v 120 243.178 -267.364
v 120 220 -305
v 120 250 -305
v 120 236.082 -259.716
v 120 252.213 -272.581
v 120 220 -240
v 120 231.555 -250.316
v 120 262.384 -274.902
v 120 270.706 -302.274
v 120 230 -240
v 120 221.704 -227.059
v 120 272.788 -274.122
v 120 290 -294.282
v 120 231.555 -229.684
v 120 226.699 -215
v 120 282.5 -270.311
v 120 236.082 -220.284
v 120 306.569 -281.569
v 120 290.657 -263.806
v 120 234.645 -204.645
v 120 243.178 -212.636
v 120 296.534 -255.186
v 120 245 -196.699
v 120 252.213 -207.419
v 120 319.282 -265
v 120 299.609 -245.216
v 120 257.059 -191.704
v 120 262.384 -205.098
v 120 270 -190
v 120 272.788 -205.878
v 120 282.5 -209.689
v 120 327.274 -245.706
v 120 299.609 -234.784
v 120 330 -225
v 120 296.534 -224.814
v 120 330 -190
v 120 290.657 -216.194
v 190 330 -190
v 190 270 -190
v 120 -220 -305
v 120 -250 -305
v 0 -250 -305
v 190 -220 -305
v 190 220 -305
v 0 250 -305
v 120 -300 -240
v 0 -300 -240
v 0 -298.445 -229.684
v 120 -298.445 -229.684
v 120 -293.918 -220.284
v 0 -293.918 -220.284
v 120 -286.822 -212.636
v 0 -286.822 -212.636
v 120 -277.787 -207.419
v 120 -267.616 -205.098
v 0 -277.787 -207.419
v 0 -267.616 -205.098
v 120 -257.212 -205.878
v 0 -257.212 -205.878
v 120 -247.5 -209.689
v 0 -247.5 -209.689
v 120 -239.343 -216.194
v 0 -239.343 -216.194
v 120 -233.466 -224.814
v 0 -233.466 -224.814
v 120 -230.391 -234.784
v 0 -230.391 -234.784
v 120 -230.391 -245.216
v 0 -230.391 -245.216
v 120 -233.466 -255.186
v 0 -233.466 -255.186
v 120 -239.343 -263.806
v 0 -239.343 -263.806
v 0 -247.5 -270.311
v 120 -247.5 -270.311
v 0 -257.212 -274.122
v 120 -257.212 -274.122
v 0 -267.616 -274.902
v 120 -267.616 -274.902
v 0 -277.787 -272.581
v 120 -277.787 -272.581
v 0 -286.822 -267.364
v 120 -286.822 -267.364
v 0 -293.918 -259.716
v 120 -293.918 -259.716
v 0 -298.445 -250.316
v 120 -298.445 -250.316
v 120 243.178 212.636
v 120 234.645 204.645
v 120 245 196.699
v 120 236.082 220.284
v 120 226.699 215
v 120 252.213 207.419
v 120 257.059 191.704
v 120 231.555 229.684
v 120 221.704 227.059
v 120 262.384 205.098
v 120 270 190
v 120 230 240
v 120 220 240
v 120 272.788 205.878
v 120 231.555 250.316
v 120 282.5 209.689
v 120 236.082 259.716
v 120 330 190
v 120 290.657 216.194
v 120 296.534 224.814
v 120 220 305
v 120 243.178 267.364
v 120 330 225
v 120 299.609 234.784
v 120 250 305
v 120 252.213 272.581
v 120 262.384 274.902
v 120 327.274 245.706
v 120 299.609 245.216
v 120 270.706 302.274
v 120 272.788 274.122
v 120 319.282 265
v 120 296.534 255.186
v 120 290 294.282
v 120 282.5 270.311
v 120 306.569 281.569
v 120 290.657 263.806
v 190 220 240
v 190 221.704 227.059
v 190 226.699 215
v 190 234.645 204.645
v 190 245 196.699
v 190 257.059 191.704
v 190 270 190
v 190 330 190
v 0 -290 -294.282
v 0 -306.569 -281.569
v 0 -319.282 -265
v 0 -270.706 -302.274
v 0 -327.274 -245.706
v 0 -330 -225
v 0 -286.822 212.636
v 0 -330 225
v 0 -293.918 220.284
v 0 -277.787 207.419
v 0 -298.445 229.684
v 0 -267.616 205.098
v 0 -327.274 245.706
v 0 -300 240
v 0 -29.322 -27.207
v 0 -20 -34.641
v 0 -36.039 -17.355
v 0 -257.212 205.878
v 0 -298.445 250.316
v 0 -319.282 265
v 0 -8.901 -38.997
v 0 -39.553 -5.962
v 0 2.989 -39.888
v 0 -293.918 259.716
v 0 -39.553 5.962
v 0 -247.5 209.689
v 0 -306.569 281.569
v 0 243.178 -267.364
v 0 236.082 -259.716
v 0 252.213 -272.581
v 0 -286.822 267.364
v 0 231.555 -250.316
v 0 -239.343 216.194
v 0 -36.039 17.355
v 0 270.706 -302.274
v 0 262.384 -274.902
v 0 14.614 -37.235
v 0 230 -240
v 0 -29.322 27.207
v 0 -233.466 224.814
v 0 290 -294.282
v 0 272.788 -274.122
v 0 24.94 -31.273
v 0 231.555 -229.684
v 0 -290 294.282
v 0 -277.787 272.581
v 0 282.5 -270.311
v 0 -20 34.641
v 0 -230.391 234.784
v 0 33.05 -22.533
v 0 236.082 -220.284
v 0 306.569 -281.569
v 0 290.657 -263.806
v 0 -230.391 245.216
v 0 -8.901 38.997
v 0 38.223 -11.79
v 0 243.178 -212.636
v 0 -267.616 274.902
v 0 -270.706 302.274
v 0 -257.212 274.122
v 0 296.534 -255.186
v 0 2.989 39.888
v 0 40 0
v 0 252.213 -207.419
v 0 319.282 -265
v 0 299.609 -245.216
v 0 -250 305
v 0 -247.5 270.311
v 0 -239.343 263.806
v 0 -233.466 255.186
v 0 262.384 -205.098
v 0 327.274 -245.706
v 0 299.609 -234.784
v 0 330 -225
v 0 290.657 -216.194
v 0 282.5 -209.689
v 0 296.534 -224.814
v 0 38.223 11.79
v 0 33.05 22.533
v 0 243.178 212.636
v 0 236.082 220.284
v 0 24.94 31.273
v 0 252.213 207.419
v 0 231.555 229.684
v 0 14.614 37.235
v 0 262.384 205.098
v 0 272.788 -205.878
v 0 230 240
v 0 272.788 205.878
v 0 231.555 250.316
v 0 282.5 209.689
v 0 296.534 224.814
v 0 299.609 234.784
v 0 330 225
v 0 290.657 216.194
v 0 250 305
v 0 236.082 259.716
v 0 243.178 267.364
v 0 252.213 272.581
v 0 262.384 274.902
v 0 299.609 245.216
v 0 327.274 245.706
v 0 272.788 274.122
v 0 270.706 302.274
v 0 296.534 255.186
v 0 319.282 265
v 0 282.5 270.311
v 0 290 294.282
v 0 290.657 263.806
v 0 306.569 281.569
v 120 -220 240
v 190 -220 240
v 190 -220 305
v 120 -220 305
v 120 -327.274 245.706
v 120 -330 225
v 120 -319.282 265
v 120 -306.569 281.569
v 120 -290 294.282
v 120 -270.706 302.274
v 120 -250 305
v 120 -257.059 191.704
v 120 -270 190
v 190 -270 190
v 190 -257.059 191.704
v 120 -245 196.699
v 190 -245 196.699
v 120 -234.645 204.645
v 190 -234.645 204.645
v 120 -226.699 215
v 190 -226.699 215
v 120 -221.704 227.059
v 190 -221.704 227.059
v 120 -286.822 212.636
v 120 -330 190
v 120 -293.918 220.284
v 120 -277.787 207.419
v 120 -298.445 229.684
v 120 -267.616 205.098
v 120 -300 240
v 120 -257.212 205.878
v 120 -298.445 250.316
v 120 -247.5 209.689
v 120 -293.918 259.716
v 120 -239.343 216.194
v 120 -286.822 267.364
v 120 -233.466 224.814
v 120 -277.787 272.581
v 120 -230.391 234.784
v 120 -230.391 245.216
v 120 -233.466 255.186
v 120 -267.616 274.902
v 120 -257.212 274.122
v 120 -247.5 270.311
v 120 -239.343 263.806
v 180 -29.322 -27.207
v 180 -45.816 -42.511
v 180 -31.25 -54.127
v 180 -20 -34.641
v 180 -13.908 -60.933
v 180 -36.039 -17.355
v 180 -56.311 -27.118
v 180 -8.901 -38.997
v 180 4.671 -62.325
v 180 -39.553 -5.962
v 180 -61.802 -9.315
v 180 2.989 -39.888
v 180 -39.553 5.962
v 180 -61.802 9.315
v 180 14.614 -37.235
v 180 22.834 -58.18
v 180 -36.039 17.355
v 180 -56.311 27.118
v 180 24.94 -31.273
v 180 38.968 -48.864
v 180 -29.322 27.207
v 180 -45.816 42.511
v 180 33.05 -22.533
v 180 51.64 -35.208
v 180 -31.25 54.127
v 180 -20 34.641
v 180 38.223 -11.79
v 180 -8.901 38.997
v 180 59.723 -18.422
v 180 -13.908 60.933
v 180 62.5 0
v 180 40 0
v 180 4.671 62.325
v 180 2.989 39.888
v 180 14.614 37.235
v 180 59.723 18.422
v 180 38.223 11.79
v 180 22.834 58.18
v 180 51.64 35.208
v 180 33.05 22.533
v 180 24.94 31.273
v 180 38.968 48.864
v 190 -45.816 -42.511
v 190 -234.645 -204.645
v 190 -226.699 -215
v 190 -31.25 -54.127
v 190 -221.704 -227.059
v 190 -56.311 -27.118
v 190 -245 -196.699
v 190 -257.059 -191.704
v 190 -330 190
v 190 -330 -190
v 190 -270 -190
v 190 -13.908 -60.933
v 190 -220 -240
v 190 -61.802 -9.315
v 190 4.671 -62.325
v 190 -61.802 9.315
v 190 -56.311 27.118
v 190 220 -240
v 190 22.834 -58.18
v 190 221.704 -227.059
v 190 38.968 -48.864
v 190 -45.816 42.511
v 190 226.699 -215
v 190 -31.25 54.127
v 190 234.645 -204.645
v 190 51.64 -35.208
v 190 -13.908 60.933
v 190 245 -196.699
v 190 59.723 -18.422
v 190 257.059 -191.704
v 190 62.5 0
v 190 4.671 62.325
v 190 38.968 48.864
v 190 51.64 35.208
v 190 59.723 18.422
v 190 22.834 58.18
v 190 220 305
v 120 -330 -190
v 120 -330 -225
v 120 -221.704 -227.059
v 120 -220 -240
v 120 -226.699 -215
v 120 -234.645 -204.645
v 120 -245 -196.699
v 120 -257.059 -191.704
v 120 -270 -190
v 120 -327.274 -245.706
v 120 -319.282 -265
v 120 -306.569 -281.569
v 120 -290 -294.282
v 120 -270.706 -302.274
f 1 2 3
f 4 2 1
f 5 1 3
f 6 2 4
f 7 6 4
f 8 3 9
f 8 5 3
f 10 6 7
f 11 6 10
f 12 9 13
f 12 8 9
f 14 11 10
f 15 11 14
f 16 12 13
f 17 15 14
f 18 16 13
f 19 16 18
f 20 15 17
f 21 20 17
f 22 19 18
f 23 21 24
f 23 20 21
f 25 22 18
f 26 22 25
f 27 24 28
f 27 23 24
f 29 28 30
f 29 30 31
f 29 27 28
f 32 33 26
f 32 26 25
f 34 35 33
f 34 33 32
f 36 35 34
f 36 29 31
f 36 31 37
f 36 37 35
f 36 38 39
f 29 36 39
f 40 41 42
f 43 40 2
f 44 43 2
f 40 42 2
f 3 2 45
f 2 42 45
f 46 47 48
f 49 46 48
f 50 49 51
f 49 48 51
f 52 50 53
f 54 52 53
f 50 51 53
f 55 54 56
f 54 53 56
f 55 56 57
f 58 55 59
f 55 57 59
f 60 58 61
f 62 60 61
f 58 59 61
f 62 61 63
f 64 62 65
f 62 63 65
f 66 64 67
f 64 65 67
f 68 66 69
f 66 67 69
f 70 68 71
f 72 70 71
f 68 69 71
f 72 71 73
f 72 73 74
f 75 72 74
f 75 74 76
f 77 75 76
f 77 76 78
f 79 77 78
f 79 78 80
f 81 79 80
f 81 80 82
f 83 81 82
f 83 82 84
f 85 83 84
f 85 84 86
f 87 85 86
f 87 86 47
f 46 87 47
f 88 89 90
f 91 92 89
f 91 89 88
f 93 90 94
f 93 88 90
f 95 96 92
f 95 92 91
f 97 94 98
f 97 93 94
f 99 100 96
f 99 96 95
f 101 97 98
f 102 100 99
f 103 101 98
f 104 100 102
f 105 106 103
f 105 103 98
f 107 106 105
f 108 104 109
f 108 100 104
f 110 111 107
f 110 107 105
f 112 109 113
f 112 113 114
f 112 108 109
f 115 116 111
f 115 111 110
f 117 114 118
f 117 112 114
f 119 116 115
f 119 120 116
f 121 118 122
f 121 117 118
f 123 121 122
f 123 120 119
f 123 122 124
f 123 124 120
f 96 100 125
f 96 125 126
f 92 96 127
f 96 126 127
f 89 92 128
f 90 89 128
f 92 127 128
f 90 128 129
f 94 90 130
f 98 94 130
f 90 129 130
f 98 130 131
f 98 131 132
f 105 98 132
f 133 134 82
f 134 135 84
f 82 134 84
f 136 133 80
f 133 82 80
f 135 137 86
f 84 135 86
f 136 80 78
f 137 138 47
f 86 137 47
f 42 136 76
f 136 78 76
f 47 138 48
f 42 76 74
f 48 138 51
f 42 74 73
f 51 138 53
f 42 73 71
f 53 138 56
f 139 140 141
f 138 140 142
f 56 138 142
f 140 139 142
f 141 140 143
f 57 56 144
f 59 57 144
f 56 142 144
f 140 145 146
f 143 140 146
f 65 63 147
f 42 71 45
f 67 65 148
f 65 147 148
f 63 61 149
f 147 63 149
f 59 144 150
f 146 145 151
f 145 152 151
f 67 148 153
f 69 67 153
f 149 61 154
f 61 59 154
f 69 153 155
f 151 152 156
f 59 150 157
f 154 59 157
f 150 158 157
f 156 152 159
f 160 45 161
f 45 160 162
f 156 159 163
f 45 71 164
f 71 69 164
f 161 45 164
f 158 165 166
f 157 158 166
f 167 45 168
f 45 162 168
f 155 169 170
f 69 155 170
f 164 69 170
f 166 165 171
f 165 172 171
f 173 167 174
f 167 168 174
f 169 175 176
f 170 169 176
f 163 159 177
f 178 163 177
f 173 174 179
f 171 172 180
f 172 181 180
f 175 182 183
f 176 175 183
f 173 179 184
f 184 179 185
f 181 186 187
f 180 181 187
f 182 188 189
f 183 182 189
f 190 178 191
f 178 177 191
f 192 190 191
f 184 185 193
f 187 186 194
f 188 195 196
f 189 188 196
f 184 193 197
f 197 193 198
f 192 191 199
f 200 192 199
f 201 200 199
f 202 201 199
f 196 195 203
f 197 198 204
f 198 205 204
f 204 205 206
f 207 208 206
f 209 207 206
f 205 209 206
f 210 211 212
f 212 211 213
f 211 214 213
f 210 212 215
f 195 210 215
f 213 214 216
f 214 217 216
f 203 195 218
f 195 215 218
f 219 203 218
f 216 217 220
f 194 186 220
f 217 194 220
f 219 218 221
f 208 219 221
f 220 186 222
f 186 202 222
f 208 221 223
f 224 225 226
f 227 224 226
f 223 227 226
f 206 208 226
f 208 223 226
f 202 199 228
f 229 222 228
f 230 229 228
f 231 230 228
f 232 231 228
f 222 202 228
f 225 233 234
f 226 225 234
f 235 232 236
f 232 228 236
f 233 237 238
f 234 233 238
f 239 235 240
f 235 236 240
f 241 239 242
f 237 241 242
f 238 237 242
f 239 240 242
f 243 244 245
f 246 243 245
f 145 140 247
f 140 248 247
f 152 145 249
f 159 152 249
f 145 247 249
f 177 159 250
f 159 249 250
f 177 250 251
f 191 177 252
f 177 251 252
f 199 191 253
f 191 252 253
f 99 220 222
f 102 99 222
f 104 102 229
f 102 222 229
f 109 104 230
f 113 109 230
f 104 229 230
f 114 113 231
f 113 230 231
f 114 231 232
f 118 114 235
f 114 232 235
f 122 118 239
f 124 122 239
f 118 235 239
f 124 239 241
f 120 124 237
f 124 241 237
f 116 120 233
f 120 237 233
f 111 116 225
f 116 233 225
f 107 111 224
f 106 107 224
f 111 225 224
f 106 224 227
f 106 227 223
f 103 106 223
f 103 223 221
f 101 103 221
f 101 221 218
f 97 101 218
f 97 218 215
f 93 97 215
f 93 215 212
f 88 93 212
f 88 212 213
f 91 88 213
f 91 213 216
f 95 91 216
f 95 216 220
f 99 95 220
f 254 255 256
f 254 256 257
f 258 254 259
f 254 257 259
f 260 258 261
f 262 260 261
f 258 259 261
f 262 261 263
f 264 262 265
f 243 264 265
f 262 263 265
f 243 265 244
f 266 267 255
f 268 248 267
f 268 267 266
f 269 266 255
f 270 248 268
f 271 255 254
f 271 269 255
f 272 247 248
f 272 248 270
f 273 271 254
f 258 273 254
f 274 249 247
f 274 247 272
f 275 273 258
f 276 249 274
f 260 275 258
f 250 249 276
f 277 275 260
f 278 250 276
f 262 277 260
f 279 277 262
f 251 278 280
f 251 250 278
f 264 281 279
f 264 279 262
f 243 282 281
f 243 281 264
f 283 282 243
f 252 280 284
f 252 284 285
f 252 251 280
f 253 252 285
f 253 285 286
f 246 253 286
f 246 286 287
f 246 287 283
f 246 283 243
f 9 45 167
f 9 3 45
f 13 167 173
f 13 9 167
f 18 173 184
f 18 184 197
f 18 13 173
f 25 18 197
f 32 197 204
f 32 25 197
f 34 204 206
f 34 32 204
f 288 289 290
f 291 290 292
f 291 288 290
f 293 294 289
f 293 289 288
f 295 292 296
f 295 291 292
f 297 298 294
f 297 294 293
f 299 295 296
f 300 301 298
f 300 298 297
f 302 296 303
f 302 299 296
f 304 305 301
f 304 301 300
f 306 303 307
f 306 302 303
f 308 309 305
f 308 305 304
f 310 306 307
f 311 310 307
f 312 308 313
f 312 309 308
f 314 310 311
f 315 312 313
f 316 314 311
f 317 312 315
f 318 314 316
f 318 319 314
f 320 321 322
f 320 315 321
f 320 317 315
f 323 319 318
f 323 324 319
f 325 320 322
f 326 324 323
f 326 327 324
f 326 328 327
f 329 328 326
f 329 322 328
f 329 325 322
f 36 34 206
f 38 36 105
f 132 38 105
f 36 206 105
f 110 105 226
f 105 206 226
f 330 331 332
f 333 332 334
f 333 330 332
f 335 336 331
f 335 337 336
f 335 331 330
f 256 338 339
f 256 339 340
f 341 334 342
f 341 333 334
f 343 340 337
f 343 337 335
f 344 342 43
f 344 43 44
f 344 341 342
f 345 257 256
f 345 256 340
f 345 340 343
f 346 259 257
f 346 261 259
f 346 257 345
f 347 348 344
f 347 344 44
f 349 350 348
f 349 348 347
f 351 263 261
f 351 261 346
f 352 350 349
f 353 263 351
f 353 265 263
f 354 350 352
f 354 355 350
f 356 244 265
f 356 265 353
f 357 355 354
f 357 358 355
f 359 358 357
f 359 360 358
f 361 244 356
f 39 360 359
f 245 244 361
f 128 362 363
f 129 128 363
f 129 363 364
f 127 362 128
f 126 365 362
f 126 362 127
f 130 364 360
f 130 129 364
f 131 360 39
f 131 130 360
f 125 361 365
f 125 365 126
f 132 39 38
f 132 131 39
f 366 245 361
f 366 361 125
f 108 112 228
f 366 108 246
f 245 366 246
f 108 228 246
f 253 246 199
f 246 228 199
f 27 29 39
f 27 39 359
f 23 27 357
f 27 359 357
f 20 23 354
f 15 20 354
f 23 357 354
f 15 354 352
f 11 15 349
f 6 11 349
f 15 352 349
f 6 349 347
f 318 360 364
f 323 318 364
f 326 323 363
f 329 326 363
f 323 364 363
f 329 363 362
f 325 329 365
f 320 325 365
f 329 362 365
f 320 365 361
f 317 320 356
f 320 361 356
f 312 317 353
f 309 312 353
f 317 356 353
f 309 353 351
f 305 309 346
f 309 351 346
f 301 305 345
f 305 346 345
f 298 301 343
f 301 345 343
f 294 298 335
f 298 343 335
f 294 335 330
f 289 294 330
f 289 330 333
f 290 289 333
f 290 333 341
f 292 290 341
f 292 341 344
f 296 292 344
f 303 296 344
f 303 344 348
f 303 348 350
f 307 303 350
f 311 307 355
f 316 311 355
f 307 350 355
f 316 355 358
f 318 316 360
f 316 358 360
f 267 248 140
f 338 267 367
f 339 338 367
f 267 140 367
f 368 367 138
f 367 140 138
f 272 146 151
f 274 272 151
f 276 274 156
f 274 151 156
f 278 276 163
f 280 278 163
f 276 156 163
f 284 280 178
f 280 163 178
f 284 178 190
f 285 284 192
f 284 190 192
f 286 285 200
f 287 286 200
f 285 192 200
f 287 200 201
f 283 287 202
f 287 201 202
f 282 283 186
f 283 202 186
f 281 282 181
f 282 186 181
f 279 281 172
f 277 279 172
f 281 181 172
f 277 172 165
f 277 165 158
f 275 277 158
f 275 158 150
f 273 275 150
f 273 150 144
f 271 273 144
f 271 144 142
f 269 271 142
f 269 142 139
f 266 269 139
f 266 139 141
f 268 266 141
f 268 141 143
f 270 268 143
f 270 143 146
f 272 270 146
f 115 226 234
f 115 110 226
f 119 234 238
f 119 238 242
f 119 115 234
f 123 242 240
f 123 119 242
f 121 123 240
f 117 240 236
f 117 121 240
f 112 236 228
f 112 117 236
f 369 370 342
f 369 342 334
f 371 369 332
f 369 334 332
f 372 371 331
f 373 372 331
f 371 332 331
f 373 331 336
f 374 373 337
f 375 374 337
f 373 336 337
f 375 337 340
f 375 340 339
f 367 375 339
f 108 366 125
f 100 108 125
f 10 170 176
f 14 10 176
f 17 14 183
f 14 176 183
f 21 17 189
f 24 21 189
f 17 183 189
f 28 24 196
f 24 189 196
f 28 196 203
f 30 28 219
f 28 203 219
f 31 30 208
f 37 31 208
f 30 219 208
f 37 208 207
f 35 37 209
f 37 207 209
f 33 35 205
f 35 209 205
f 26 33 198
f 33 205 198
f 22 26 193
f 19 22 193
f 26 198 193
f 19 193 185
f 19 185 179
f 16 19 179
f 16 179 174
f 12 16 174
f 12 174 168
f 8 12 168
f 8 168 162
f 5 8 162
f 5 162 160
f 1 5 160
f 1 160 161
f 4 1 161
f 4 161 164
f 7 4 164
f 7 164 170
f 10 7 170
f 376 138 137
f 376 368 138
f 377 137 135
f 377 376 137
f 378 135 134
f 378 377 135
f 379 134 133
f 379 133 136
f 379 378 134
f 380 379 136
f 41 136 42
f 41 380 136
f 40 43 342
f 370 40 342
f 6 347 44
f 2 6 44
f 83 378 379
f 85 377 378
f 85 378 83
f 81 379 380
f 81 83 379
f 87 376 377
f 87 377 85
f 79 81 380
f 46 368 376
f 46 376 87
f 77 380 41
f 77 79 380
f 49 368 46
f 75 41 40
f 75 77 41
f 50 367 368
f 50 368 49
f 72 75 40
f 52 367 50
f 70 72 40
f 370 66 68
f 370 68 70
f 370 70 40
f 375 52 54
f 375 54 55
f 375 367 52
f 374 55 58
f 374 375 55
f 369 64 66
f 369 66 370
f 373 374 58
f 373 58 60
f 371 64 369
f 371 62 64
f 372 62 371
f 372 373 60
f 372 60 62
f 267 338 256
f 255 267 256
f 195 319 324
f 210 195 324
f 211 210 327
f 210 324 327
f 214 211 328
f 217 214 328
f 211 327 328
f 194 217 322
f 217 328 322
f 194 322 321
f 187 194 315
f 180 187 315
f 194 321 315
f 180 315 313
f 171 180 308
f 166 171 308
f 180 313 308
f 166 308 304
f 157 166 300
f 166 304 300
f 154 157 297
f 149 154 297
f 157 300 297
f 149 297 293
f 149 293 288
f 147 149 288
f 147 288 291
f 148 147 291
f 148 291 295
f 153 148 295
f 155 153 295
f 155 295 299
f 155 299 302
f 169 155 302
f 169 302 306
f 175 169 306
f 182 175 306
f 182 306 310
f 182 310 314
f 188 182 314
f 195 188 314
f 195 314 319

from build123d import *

# Parameters (mm, degrees)
F0_W      = 660
F0_H      = 610
F1_DEPTH  = 120
F2_R      = 80
F4_DEPTH  = 70
F6_DEPTH  = 70
F7_DEPTH  = 70
F8_R      = 62.5
F9_DEPTH  = 10
F10_R     = 40
F11_DEPTH = 180.001
F12_R     = 35
F13_DEPTH = 190.001


with BuildPart() as f1:
    # F0 (on Right) → F1 (new body)
    with BuildSketch(Plane.YZ):
        Rectangle(F0_W, F0_H)
    extrude(amount=F1_DEPTH)

    # F2
    f2_edges = [f1.edges().sort_by_distance(p)[0] for p in [
        (60, 330, 305),
        (60, -330, 305),
        (60, 330, -305),
        (60, -330, -305),
    ]]
    fillet(f2_edges, radius=F2_R)

    # F3 (on face) → F4 (join)
    with BuildSketch(Plane.YZ.offset(120)):
        with BuildLine():
            ThreePointArc((250, 305), (306.5685424949, 281.5685424949), (330, 225))
            Line((330, 225), (330, 305))
            Line((330, 305), (250, 305))
        make_face()
        with BuildLine():
            Line((-330, 305), (-330, 225))
            ThreePointArc((-330, 225), (-306.5685424949, 281.5685424949), (-250, 305))
            Line((-250, 305), (-330, 305))
        make_face()
        with BuildLine():
            Line((-250, -305), (250, -305))
            ThreePointArc((250, -305), (306.5685424949, -281.5685424949), (330, -225))
            Line((330, -225), (330, 225))
            ThreePointArc((330, 225), (306.5685424949, 281.5685424949), (250, 305))
            Line((250, 305), (-250, 305))
            ThreePointArc((-250, 305), (-306.5685424949, 281.5685424949), (-330, 225))
            Line((-330, 225), (-330, -225))
            ThreePointArc((-330, -225), (-306.5685424949, -281.5685424949), (-250, -305))
        make_face()
        with BuildLine():
            Line((250, -305), (330, -305))
            Line((330, -305), (330, -225))
            ThreePointArc((330, -225), (306.5685424949, -281.5685424949), (250, -305))
        make_face()
        with BuildLine():
            Line((-330, -305), (-250, -305))
            ThreePointArc((-250, -305), (-306.5685424949, -281.5685424949), (-330, -225))
            Line((-330, -225), (-330, -305))
        make_face()
    extrude(amount=F4_DEPTH)

    # F5 (on face) → F6 (cut)
    with BuildSketch(Plane.YZ.offset(190)):
        with BuildLine():
            ThreePointArc((-270, 190), (-234.6446609407, 204.6446609407), (-220, 240))
            Line((-220, 240), (-220, 305))
            Line((-220, 305), (-330, 305))
            Line((-330, 305), (-330, 190))
            Line((-330, 190), (-270, 190))
        make_face()
    extrude(amount=-F6_DEPTH, mode=Mode.SUBTRACT)

    # F5 (on face) → F7 (cut)
    with BuildSketch(Plane.YZ.offset(190)):
        with BuildLine():
            Line((330, 305), (220, 305))
            Line((220, 305), (220, 240))
            ThreePointArc((220, 240), (234.6446609407, 204.6446609407), (270, 190))
            Line((270, 190), (330, 190))
            Line((330, 190), (330, 305))
        make_face()
        with BuildLine():
            Line((220, -240), (220, -305))
            Line((220, -305), (330, -305))
            Line((330, -305), (330, -190))
            Line((330, -190), (270, -190))
            ThreePointArc((270, -190), (234.6446609407, -204.6446609407), (220, -240))
        make_face()
        with BuildLine():
            Line((-270, -190), (-330, -190))
            Line((-330, -190), (-330, -305))
            Line((-330, -305), (-220, -305))
            Line((-220, -305), (-220, -240))
            ThreePointArc((-220, -240), (-234.6446609407, -204.6446609407), (-270, -190))
        make_face()
    extrude(amount=-F7_DEPTH, mode=Mode.SUBTRACT)

    # F8 (on face) → F9 (cut)
    with BuildSketch(Plane.YZ.offset(190)):
        Circle(F8_R)
    extrude(amount=-F9_DEPTH, mode=Mode.SUBTRACT)

    # F10 (on face) → F11 (cut, through all)
    with BuildSketch(Plane.YZ.offset(180)):
        Circle(F10_R)
    extrude(amount=-F11_DEPTH, mode=Mode.SUBTRACT)

    # F12 (on face) → F13 (cut, through all)
    with BuildSketch(Plane(origin=(0, 0, 0), x_dir=(0, -1, 0), z_dir=(-1, 0, 0))):
        with Locations((-265, 240)):
            Circle(F12_R)
        with Locations((265, 240)):
            Circle(F12_R)
        with Locations((265, -240)):
            Circle(F12_R)
        with Locations((-265, -240)):
            Circle(F12_R)
    extrude(amount=-F13_DEPTH, mode=Mode.SUBTRACT)


solid = f1.part
